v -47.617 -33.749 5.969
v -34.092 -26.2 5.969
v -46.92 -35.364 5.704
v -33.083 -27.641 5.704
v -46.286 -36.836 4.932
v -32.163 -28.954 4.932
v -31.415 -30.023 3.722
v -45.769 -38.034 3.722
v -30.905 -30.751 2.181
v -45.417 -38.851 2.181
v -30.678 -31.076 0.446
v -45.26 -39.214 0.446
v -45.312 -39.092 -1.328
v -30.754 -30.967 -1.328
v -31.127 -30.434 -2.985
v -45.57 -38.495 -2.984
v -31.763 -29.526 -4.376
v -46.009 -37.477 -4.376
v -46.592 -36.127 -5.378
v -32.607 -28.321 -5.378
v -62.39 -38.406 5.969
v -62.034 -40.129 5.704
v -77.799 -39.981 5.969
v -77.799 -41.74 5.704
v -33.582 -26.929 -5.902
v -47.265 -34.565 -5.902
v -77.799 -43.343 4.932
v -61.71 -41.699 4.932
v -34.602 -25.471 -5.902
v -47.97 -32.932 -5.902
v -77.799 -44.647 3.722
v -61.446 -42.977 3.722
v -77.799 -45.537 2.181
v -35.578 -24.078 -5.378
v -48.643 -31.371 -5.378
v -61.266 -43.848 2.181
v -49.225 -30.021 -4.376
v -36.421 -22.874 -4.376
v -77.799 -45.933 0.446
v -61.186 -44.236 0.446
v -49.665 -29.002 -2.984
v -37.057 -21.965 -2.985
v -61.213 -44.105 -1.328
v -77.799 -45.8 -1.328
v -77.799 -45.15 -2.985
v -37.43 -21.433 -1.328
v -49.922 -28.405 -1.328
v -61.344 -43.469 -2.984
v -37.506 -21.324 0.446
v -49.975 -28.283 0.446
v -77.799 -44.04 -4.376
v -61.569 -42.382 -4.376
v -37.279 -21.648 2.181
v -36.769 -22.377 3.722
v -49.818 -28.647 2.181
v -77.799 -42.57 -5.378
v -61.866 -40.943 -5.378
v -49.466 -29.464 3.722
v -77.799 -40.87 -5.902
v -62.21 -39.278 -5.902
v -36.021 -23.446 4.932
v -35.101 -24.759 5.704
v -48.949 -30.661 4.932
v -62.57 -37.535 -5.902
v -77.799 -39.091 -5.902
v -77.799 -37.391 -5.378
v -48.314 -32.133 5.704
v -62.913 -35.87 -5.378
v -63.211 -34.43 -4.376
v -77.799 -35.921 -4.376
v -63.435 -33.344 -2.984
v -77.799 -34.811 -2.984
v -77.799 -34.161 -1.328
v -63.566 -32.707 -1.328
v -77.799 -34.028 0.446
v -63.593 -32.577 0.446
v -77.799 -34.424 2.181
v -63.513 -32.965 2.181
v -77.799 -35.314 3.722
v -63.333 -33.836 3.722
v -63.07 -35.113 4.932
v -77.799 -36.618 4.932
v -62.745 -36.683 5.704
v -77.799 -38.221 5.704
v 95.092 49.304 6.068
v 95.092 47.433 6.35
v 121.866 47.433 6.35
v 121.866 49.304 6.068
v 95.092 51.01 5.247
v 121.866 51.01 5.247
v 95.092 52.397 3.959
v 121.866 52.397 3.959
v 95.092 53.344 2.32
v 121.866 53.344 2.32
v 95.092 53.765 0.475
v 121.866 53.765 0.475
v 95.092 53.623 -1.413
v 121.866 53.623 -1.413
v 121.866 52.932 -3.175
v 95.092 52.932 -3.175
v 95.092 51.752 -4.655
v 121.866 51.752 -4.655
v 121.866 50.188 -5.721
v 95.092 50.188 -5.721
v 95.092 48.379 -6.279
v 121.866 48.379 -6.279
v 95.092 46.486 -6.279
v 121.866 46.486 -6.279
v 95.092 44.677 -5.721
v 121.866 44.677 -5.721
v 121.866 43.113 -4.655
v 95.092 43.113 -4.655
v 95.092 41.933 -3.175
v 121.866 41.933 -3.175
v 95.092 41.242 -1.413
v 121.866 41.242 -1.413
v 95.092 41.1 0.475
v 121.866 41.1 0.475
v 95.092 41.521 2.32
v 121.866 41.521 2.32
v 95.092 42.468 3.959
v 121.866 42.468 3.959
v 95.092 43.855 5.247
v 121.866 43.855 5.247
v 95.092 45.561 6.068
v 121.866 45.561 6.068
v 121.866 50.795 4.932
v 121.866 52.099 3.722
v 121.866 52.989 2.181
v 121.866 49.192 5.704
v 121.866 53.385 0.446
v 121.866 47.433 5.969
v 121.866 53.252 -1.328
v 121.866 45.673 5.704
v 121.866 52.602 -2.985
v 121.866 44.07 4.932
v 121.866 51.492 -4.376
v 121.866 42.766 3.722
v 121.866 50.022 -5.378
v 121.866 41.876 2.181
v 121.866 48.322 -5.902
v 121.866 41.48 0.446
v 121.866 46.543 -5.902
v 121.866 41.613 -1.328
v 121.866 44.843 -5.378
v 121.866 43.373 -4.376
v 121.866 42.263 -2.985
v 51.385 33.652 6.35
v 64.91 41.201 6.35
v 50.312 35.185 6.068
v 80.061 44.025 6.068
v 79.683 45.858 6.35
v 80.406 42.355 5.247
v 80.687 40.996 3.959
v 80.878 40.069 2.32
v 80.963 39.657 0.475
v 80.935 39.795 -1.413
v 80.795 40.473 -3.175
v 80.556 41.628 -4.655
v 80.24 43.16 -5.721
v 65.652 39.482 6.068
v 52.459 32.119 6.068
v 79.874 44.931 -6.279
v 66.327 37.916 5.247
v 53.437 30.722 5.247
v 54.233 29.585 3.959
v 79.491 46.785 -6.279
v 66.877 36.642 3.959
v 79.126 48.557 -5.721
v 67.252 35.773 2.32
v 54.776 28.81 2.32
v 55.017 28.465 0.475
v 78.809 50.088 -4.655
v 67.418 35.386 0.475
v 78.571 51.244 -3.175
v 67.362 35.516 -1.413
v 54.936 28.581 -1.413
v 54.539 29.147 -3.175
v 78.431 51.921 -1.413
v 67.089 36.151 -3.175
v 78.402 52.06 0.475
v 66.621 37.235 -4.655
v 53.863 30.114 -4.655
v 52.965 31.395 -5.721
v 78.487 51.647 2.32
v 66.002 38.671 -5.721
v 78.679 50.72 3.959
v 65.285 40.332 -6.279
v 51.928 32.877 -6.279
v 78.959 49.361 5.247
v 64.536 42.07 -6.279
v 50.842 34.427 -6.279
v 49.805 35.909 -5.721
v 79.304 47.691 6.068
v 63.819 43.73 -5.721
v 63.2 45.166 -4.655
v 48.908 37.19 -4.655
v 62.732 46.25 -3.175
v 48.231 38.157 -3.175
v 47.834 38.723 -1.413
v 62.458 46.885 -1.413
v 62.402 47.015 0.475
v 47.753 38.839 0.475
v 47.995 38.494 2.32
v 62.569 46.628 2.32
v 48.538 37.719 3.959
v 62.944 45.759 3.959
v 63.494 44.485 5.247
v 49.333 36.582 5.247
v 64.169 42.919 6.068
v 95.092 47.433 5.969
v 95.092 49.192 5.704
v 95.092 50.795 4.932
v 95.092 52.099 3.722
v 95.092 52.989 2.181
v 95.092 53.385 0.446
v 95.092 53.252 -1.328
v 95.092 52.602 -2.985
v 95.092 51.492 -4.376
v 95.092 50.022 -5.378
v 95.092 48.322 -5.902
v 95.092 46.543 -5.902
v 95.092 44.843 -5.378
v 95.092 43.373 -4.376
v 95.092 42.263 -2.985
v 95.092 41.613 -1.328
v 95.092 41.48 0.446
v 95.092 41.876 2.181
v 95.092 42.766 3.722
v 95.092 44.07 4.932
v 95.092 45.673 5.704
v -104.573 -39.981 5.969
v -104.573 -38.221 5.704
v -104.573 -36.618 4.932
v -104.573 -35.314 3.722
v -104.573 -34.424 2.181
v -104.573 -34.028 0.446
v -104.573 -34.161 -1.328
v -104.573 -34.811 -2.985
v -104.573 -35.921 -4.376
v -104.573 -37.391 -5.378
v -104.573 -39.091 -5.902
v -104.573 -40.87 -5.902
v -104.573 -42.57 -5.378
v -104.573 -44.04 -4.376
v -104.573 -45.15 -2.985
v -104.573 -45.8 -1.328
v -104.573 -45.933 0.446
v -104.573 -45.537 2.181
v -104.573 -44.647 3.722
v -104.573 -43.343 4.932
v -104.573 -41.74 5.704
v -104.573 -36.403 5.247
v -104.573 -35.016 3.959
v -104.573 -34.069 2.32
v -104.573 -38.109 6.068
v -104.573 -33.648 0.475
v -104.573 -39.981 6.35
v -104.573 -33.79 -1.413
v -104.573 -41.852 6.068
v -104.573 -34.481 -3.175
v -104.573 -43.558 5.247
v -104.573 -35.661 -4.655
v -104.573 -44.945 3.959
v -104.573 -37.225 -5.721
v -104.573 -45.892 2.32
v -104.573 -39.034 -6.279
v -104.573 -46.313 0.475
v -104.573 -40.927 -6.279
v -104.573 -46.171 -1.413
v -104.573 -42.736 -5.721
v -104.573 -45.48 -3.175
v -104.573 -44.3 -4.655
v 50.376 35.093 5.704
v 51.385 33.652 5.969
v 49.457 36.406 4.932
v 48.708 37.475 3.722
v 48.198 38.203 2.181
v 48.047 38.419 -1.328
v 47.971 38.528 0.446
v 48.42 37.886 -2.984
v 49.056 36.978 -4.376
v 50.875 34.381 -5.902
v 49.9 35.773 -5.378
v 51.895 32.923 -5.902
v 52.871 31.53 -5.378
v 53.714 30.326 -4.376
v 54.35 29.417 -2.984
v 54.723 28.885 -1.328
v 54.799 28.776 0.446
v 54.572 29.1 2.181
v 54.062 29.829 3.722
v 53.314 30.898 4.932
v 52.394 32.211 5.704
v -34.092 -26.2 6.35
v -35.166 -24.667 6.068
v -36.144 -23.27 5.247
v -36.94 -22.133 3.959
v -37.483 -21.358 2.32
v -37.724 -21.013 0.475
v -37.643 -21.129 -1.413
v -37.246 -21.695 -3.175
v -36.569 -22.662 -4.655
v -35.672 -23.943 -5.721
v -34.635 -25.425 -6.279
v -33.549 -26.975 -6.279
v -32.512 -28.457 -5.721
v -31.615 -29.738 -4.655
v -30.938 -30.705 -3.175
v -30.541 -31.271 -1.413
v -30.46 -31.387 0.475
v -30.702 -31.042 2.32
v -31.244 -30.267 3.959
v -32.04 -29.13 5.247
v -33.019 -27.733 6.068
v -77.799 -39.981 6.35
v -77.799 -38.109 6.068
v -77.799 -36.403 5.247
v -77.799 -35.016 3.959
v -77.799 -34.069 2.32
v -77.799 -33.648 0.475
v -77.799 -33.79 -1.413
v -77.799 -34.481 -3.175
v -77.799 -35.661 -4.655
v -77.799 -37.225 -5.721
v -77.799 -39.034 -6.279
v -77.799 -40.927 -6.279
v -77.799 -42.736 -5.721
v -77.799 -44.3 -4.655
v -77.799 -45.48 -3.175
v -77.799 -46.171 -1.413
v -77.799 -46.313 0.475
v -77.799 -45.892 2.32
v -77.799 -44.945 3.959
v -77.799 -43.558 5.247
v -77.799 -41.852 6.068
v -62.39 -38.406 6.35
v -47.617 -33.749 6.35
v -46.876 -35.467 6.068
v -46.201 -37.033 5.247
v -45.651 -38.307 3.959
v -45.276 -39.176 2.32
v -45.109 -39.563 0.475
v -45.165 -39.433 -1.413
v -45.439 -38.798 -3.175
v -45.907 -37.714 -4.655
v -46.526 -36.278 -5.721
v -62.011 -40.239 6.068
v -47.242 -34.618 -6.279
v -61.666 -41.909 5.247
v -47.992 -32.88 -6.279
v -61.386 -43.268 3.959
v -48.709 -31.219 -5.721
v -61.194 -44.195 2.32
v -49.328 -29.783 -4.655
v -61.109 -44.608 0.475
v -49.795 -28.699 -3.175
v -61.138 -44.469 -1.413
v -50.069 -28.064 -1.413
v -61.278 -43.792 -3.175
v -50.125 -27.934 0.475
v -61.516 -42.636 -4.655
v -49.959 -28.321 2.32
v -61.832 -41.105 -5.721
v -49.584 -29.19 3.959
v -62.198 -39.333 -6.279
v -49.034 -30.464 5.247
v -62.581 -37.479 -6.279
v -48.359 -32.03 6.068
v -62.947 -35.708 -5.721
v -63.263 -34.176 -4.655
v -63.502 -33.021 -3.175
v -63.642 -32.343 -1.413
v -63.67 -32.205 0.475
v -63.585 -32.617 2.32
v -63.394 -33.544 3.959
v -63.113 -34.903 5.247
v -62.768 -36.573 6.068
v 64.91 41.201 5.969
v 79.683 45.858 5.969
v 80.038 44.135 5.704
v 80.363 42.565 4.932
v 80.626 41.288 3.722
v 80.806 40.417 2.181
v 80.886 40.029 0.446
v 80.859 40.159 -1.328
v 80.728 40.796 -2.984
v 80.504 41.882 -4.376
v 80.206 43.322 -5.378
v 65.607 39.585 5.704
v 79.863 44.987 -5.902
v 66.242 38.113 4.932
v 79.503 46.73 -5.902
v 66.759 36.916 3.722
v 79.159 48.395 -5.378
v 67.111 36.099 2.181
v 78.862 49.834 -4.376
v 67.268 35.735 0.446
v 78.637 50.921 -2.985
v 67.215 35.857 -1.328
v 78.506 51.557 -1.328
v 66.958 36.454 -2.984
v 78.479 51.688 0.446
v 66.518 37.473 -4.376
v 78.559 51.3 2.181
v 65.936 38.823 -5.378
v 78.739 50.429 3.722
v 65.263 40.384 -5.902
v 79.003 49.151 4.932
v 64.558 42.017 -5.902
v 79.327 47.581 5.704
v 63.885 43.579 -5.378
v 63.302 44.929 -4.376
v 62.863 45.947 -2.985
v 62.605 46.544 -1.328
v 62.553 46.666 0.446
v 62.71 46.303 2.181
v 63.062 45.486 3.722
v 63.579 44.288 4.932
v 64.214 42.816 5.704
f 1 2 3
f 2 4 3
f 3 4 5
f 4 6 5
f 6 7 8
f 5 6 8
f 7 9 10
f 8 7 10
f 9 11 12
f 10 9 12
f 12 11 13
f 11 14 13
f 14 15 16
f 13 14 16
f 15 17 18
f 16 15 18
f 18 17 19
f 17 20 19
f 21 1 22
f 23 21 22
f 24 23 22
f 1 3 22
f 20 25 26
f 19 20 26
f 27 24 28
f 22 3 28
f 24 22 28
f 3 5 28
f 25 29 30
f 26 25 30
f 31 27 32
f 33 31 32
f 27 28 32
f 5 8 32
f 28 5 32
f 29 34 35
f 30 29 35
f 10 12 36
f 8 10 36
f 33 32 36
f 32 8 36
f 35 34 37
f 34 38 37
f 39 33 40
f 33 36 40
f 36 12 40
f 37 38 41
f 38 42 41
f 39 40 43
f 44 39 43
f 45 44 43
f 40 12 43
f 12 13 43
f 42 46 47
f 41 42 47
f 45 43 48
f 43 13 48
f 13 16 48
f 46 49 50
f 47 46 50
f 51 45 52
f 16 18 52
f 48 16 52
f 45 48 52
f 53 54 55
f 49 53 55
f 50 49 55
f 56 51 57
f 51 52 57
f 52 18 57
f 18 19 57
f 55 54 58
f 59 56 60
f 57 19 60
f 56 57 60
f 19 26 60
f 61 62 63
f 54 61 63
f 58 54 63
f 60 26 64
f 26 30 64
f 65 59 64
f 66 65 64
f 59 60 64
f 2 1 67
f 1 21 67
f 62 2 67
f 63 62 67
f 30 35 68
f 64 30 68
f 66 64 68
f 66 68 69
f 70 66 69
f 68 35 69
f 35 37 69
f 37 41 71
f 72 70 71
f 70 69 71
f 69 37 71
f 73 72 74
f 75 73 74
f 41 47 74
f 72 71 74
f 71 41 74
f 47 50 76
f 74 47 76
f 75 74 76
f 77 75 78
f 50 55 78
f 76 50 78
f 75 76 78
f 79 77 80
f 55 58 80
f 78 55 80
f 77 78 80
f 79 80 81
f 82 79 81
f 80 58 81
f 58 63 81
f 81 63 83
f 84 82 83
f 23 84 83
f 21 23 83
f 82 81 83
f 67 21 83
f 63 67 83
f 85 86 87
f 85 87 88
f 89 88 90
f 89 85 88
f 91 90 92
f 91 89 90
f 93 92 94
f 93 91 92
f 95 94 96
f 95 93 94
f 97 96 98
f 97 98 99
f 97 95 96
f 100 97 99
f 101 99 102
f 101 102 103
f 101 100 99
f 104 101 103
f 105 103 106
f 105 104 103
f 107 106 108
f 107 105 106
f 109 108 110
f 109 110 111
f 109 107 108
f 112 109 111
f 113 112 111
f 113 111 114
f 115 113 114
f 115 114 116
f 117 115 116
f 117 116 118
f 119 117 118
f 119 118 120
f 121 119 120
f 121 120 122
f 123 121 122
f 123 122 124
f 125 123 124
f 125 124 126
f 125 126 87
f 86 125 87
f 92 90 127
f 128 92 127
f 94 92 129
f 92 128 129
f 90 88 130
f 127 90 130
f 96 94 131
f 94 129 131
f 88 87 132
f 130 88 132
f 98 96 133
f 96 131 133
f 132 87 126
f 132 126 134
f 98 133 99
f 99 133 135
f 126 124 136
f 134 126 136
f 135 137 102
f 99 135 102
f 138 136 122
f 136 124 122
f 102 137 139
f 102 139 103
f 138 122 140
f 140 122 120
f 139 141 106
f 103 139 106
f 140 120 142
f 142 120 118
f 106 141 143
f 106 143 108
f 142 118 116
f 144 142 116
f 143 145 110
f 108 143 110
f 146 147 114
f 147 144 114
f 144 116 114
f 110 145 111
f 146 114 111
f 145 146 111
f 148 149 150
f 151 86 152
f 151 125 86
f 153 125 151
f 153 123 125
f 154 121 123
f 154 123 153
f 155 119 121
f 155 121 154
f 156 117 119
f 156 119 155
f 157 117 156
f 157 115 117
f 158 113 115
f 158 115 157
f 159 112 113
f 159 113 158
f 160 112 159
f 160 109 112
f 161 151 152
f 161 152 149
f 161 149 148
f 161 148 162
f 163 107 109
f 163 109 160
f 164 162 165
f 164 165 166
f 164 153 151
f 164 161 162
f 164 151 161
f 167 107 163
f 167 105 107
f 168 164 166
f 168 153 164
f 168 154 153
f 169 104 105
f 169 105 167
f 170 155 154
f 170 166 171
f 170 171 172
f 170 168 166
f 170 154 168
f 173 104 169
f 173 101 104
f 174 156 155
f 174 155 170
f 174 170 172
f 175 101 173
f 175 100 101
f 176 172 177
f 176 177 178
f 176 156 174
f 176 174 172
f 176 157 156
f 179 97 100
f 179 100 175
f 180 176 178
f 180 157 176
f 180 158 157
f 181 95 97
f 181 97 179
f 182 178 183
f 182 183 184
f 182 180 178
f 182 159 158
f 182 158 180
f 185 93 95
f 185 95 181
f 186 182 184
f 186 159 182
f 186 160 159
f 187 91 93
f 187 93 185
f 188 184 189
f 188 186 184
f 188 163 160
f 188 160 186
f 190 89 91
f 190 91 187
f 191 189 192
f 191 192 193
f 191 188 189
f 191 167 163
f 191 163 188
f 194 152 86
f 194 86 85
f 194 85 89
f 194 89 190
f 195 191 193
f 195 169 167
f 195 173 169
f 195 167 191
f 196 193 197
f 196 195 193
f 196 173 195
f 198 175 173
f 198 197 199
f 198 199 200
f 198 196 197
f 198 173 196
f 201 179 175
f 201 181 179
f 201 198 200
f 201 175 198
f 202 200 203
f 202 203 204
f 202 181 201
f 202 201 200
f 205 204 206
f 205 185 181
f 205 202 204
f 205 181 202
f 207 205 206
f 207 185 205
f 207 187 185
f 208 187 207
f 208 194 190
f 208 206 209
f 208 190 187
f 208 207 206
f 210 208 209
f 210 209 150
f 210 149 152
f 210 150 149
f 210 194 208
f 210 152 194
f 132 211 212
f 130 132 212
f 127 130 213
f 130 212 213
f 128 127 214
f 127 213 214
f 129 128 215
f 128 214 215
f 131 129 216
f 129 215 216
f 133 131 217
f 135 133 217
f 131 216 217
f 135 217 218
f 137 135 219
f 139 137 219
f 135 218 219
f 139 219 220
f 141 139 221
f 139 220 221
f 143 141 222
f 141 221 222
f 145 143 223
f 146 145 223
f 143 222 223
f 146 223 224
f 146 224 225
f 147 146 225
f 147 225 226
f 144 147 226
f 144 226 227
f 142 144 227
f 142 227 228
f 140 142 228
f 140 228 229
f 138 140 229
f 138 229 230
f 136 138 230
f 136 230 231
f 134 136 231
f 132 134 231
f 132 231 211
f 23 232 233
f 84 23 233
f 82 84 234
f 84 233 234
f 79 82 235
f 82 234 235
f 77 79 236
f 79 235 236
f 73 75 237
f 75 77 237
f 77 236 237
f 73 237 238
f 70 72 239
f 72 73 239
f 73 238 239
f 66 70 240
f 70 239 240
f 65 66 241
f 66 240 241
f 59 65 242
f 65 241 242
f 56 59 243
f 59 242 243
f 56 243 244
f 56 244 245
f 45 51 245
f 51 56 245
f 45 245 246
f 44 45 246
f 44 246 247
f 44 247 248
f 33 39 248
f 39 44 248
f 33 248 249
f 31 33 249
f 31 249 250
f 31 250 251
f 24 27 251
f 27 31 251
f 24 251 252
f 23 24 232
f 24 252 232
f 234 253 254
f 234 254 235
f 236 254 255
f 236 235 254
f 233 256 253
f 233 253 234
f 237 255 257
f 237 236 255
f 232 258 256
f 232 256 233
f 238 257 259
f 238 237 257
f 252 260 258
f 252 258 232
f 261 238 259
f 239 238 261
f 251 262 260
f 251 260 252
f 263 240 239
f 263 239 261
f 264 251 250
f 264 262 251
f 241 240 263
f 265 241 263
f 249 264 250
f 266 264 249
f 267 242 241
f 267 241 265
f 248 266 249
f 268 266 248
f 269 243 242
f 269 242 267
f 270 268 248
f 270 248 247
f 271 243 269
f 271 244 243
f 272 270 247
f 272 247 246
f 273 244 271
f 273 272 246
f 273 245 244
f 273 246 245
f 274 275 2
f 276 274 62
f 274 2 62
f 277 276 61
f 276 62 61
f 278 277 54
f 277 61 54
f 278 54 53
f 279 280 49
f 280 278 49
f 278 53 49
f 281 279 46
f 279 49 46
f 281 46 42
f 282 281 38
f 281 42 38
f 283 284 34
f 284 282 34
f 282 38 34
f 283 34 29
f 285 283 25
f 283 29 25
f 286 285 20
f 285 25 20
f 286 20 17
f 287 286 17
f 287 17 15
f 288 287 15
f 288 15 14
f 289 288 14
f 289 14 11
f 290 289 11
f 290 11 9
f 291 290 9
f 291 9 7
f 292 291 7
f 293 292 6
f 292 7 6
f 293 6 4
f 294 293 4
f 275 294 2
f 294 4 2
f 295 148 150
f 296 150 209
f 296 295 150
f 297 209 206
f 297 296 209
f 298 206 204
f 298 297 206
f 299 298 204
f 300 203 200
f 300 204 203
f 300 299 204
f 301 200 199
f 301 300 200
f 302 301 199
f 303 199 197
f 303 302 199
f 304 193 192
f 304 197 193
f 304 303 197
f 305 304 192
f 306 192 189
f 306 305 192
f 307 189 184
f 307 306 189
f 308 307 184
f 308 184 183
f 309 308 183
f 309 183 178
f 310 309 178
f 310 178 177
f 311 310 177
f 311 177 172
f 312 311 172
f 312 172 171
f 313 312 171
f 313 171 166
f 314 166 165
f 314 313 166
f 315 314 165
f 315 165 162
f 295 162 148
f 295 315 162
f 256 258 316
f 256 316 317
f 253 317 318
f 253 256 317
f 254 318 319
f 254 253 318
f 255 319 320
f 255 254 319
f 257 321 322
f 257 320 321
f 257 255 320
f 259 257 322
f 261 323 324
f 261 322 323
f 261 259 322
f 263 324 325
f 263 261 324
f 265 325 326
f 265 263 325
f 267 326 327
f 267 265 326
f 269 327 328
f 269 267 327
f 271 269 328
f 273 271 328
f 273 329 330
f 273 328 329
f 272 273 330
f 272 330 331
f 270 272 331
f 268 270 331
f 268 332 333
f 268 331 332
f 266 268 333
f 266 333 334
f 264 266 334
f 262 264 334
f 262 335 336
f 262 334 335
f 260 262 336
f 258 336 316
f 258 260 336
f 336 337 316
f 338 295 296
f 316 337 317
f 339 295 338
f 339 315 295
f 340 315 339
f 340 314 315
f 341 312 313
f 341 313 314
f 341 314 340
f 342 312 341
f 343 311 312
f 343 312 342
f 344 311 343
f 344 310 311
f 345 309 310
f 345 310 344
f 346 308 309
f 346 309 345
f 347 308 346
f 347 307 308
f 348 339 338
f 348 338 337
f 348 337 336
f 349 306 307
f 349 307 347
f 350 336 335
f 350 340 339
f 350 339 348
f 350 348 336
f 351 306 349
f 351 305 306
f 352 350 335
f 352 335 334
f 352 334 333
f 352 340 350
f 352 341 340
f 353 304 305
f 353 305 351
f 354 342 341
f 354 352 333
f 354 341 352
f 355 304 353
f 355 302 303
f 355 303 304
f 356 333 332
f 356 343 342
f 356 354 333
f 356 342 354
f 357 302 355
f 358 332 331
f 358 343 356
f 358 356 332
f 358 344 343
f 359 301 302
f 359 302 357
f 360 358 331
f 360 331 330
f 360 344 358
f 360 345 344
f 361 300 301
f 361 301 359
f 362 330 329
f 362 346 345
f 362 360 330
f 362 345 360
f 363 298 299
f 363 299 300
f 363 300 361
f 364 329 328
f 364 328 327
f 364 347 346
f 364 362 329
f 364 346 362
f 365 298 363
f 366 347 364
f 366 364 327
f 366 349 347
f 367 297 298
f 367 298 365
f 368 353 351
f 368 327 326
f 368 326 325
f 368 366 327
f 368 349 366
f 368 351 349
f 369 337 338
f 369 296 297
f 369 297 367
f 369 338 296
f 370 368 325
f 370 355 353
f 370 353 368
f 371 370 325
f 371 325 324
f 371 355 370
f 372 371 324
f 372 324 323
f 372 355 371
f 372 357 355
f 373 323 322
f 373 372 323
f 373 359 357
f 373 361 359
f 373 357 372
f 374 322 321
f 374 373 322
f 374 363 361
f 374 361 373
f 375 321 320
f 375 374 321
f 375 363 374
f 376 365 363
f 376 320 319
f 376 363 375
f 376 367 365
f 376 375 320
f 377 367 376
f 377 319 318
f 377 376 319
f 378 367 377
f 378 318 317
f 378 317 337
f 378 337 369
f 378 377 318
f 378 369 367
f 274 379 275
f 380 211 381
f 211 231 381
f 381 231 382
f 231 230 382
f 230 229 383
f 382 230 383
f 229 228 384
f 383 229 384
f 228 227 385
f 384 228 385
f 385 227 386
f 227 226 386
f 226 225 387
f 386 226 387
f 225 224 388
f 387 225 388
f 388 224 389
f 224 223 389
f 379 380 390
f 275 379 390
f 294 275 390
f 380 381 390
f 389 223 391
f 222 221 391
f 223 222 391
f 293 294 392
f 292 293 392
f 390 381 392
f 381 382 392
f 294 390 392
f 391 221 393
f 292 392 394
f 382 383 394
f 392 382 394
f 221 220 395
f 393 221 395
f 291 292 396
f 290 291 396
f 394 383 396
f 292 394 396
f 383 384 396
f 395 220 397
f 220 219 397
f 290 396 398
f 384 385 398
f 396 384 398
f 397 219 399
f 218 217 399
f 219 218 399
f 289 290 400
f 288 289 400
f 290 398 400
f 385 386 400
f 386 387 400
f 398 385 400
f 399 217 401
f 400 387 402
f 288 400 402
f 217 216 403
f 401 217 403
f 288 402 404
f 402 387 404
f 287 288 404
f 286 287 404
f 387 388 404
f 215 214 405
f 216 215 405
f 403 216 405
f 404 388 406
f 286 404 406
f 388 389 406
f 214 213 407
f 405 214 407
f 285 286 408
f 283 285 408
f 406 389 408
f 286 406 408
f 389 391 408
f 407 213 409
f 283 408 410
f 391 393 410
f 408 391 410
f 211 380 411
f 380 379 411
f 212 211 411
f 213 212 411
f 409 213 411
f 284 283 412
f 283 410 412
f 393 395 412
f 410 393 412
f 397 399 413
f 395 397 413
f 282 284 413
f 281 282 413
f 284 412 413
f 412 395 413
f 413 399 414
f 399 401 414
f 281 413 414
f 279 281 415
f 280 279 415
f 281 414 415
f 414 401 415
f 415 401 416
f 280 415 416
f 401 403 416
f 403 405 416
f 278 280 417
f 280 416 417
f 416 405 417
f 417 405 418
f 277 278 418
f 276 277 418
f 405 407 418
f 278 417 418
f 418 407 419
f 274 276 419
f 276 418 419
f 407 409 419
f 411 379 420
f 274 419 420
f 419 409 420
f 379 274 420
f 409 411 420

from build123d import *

# Parameters (mm, degrees)
SKETCH5_R   = 6.35
SKETCH5_R_2 = 5.969


with BuildPart() as part:
    # Sweep1: sweep along a path in Sketch4
    with BuildLine(Plane.XY) as sweep1_path:
        Line((121.865926636, 47.432526586), (95.091694349, 47.432526586))
        ThreePointArc((95.091694349, 47.432526586), (72.177912426, 43.905758233), (51.385169899, 33.651912361))
        Line((51.385169899, 33.651912361), (-34.092088176, -26.199908089))
        ThreePointArc((-34.092088176, -26.199908089), (-54.884830704, -36.453753961), (-77.798612626, -39.980522314))
        Line((-77.798612626, -39.980522314), (-104.572844914, -39.980522314))
    # Sketch5 → Sweep1 (sweep)
    with BuildSketch(Plane(origin=(121.865926636, 47.432526586, 0), x_dir=(0, 0, 1), z_dir=(-1, 0, 0))):
        Circle(SKETCH5_R)
        Circle(SKETCH5_R_2, mode=Mode.SUBTRACT)
    sweep(path=sweep1_path.line)


solid = part.part
